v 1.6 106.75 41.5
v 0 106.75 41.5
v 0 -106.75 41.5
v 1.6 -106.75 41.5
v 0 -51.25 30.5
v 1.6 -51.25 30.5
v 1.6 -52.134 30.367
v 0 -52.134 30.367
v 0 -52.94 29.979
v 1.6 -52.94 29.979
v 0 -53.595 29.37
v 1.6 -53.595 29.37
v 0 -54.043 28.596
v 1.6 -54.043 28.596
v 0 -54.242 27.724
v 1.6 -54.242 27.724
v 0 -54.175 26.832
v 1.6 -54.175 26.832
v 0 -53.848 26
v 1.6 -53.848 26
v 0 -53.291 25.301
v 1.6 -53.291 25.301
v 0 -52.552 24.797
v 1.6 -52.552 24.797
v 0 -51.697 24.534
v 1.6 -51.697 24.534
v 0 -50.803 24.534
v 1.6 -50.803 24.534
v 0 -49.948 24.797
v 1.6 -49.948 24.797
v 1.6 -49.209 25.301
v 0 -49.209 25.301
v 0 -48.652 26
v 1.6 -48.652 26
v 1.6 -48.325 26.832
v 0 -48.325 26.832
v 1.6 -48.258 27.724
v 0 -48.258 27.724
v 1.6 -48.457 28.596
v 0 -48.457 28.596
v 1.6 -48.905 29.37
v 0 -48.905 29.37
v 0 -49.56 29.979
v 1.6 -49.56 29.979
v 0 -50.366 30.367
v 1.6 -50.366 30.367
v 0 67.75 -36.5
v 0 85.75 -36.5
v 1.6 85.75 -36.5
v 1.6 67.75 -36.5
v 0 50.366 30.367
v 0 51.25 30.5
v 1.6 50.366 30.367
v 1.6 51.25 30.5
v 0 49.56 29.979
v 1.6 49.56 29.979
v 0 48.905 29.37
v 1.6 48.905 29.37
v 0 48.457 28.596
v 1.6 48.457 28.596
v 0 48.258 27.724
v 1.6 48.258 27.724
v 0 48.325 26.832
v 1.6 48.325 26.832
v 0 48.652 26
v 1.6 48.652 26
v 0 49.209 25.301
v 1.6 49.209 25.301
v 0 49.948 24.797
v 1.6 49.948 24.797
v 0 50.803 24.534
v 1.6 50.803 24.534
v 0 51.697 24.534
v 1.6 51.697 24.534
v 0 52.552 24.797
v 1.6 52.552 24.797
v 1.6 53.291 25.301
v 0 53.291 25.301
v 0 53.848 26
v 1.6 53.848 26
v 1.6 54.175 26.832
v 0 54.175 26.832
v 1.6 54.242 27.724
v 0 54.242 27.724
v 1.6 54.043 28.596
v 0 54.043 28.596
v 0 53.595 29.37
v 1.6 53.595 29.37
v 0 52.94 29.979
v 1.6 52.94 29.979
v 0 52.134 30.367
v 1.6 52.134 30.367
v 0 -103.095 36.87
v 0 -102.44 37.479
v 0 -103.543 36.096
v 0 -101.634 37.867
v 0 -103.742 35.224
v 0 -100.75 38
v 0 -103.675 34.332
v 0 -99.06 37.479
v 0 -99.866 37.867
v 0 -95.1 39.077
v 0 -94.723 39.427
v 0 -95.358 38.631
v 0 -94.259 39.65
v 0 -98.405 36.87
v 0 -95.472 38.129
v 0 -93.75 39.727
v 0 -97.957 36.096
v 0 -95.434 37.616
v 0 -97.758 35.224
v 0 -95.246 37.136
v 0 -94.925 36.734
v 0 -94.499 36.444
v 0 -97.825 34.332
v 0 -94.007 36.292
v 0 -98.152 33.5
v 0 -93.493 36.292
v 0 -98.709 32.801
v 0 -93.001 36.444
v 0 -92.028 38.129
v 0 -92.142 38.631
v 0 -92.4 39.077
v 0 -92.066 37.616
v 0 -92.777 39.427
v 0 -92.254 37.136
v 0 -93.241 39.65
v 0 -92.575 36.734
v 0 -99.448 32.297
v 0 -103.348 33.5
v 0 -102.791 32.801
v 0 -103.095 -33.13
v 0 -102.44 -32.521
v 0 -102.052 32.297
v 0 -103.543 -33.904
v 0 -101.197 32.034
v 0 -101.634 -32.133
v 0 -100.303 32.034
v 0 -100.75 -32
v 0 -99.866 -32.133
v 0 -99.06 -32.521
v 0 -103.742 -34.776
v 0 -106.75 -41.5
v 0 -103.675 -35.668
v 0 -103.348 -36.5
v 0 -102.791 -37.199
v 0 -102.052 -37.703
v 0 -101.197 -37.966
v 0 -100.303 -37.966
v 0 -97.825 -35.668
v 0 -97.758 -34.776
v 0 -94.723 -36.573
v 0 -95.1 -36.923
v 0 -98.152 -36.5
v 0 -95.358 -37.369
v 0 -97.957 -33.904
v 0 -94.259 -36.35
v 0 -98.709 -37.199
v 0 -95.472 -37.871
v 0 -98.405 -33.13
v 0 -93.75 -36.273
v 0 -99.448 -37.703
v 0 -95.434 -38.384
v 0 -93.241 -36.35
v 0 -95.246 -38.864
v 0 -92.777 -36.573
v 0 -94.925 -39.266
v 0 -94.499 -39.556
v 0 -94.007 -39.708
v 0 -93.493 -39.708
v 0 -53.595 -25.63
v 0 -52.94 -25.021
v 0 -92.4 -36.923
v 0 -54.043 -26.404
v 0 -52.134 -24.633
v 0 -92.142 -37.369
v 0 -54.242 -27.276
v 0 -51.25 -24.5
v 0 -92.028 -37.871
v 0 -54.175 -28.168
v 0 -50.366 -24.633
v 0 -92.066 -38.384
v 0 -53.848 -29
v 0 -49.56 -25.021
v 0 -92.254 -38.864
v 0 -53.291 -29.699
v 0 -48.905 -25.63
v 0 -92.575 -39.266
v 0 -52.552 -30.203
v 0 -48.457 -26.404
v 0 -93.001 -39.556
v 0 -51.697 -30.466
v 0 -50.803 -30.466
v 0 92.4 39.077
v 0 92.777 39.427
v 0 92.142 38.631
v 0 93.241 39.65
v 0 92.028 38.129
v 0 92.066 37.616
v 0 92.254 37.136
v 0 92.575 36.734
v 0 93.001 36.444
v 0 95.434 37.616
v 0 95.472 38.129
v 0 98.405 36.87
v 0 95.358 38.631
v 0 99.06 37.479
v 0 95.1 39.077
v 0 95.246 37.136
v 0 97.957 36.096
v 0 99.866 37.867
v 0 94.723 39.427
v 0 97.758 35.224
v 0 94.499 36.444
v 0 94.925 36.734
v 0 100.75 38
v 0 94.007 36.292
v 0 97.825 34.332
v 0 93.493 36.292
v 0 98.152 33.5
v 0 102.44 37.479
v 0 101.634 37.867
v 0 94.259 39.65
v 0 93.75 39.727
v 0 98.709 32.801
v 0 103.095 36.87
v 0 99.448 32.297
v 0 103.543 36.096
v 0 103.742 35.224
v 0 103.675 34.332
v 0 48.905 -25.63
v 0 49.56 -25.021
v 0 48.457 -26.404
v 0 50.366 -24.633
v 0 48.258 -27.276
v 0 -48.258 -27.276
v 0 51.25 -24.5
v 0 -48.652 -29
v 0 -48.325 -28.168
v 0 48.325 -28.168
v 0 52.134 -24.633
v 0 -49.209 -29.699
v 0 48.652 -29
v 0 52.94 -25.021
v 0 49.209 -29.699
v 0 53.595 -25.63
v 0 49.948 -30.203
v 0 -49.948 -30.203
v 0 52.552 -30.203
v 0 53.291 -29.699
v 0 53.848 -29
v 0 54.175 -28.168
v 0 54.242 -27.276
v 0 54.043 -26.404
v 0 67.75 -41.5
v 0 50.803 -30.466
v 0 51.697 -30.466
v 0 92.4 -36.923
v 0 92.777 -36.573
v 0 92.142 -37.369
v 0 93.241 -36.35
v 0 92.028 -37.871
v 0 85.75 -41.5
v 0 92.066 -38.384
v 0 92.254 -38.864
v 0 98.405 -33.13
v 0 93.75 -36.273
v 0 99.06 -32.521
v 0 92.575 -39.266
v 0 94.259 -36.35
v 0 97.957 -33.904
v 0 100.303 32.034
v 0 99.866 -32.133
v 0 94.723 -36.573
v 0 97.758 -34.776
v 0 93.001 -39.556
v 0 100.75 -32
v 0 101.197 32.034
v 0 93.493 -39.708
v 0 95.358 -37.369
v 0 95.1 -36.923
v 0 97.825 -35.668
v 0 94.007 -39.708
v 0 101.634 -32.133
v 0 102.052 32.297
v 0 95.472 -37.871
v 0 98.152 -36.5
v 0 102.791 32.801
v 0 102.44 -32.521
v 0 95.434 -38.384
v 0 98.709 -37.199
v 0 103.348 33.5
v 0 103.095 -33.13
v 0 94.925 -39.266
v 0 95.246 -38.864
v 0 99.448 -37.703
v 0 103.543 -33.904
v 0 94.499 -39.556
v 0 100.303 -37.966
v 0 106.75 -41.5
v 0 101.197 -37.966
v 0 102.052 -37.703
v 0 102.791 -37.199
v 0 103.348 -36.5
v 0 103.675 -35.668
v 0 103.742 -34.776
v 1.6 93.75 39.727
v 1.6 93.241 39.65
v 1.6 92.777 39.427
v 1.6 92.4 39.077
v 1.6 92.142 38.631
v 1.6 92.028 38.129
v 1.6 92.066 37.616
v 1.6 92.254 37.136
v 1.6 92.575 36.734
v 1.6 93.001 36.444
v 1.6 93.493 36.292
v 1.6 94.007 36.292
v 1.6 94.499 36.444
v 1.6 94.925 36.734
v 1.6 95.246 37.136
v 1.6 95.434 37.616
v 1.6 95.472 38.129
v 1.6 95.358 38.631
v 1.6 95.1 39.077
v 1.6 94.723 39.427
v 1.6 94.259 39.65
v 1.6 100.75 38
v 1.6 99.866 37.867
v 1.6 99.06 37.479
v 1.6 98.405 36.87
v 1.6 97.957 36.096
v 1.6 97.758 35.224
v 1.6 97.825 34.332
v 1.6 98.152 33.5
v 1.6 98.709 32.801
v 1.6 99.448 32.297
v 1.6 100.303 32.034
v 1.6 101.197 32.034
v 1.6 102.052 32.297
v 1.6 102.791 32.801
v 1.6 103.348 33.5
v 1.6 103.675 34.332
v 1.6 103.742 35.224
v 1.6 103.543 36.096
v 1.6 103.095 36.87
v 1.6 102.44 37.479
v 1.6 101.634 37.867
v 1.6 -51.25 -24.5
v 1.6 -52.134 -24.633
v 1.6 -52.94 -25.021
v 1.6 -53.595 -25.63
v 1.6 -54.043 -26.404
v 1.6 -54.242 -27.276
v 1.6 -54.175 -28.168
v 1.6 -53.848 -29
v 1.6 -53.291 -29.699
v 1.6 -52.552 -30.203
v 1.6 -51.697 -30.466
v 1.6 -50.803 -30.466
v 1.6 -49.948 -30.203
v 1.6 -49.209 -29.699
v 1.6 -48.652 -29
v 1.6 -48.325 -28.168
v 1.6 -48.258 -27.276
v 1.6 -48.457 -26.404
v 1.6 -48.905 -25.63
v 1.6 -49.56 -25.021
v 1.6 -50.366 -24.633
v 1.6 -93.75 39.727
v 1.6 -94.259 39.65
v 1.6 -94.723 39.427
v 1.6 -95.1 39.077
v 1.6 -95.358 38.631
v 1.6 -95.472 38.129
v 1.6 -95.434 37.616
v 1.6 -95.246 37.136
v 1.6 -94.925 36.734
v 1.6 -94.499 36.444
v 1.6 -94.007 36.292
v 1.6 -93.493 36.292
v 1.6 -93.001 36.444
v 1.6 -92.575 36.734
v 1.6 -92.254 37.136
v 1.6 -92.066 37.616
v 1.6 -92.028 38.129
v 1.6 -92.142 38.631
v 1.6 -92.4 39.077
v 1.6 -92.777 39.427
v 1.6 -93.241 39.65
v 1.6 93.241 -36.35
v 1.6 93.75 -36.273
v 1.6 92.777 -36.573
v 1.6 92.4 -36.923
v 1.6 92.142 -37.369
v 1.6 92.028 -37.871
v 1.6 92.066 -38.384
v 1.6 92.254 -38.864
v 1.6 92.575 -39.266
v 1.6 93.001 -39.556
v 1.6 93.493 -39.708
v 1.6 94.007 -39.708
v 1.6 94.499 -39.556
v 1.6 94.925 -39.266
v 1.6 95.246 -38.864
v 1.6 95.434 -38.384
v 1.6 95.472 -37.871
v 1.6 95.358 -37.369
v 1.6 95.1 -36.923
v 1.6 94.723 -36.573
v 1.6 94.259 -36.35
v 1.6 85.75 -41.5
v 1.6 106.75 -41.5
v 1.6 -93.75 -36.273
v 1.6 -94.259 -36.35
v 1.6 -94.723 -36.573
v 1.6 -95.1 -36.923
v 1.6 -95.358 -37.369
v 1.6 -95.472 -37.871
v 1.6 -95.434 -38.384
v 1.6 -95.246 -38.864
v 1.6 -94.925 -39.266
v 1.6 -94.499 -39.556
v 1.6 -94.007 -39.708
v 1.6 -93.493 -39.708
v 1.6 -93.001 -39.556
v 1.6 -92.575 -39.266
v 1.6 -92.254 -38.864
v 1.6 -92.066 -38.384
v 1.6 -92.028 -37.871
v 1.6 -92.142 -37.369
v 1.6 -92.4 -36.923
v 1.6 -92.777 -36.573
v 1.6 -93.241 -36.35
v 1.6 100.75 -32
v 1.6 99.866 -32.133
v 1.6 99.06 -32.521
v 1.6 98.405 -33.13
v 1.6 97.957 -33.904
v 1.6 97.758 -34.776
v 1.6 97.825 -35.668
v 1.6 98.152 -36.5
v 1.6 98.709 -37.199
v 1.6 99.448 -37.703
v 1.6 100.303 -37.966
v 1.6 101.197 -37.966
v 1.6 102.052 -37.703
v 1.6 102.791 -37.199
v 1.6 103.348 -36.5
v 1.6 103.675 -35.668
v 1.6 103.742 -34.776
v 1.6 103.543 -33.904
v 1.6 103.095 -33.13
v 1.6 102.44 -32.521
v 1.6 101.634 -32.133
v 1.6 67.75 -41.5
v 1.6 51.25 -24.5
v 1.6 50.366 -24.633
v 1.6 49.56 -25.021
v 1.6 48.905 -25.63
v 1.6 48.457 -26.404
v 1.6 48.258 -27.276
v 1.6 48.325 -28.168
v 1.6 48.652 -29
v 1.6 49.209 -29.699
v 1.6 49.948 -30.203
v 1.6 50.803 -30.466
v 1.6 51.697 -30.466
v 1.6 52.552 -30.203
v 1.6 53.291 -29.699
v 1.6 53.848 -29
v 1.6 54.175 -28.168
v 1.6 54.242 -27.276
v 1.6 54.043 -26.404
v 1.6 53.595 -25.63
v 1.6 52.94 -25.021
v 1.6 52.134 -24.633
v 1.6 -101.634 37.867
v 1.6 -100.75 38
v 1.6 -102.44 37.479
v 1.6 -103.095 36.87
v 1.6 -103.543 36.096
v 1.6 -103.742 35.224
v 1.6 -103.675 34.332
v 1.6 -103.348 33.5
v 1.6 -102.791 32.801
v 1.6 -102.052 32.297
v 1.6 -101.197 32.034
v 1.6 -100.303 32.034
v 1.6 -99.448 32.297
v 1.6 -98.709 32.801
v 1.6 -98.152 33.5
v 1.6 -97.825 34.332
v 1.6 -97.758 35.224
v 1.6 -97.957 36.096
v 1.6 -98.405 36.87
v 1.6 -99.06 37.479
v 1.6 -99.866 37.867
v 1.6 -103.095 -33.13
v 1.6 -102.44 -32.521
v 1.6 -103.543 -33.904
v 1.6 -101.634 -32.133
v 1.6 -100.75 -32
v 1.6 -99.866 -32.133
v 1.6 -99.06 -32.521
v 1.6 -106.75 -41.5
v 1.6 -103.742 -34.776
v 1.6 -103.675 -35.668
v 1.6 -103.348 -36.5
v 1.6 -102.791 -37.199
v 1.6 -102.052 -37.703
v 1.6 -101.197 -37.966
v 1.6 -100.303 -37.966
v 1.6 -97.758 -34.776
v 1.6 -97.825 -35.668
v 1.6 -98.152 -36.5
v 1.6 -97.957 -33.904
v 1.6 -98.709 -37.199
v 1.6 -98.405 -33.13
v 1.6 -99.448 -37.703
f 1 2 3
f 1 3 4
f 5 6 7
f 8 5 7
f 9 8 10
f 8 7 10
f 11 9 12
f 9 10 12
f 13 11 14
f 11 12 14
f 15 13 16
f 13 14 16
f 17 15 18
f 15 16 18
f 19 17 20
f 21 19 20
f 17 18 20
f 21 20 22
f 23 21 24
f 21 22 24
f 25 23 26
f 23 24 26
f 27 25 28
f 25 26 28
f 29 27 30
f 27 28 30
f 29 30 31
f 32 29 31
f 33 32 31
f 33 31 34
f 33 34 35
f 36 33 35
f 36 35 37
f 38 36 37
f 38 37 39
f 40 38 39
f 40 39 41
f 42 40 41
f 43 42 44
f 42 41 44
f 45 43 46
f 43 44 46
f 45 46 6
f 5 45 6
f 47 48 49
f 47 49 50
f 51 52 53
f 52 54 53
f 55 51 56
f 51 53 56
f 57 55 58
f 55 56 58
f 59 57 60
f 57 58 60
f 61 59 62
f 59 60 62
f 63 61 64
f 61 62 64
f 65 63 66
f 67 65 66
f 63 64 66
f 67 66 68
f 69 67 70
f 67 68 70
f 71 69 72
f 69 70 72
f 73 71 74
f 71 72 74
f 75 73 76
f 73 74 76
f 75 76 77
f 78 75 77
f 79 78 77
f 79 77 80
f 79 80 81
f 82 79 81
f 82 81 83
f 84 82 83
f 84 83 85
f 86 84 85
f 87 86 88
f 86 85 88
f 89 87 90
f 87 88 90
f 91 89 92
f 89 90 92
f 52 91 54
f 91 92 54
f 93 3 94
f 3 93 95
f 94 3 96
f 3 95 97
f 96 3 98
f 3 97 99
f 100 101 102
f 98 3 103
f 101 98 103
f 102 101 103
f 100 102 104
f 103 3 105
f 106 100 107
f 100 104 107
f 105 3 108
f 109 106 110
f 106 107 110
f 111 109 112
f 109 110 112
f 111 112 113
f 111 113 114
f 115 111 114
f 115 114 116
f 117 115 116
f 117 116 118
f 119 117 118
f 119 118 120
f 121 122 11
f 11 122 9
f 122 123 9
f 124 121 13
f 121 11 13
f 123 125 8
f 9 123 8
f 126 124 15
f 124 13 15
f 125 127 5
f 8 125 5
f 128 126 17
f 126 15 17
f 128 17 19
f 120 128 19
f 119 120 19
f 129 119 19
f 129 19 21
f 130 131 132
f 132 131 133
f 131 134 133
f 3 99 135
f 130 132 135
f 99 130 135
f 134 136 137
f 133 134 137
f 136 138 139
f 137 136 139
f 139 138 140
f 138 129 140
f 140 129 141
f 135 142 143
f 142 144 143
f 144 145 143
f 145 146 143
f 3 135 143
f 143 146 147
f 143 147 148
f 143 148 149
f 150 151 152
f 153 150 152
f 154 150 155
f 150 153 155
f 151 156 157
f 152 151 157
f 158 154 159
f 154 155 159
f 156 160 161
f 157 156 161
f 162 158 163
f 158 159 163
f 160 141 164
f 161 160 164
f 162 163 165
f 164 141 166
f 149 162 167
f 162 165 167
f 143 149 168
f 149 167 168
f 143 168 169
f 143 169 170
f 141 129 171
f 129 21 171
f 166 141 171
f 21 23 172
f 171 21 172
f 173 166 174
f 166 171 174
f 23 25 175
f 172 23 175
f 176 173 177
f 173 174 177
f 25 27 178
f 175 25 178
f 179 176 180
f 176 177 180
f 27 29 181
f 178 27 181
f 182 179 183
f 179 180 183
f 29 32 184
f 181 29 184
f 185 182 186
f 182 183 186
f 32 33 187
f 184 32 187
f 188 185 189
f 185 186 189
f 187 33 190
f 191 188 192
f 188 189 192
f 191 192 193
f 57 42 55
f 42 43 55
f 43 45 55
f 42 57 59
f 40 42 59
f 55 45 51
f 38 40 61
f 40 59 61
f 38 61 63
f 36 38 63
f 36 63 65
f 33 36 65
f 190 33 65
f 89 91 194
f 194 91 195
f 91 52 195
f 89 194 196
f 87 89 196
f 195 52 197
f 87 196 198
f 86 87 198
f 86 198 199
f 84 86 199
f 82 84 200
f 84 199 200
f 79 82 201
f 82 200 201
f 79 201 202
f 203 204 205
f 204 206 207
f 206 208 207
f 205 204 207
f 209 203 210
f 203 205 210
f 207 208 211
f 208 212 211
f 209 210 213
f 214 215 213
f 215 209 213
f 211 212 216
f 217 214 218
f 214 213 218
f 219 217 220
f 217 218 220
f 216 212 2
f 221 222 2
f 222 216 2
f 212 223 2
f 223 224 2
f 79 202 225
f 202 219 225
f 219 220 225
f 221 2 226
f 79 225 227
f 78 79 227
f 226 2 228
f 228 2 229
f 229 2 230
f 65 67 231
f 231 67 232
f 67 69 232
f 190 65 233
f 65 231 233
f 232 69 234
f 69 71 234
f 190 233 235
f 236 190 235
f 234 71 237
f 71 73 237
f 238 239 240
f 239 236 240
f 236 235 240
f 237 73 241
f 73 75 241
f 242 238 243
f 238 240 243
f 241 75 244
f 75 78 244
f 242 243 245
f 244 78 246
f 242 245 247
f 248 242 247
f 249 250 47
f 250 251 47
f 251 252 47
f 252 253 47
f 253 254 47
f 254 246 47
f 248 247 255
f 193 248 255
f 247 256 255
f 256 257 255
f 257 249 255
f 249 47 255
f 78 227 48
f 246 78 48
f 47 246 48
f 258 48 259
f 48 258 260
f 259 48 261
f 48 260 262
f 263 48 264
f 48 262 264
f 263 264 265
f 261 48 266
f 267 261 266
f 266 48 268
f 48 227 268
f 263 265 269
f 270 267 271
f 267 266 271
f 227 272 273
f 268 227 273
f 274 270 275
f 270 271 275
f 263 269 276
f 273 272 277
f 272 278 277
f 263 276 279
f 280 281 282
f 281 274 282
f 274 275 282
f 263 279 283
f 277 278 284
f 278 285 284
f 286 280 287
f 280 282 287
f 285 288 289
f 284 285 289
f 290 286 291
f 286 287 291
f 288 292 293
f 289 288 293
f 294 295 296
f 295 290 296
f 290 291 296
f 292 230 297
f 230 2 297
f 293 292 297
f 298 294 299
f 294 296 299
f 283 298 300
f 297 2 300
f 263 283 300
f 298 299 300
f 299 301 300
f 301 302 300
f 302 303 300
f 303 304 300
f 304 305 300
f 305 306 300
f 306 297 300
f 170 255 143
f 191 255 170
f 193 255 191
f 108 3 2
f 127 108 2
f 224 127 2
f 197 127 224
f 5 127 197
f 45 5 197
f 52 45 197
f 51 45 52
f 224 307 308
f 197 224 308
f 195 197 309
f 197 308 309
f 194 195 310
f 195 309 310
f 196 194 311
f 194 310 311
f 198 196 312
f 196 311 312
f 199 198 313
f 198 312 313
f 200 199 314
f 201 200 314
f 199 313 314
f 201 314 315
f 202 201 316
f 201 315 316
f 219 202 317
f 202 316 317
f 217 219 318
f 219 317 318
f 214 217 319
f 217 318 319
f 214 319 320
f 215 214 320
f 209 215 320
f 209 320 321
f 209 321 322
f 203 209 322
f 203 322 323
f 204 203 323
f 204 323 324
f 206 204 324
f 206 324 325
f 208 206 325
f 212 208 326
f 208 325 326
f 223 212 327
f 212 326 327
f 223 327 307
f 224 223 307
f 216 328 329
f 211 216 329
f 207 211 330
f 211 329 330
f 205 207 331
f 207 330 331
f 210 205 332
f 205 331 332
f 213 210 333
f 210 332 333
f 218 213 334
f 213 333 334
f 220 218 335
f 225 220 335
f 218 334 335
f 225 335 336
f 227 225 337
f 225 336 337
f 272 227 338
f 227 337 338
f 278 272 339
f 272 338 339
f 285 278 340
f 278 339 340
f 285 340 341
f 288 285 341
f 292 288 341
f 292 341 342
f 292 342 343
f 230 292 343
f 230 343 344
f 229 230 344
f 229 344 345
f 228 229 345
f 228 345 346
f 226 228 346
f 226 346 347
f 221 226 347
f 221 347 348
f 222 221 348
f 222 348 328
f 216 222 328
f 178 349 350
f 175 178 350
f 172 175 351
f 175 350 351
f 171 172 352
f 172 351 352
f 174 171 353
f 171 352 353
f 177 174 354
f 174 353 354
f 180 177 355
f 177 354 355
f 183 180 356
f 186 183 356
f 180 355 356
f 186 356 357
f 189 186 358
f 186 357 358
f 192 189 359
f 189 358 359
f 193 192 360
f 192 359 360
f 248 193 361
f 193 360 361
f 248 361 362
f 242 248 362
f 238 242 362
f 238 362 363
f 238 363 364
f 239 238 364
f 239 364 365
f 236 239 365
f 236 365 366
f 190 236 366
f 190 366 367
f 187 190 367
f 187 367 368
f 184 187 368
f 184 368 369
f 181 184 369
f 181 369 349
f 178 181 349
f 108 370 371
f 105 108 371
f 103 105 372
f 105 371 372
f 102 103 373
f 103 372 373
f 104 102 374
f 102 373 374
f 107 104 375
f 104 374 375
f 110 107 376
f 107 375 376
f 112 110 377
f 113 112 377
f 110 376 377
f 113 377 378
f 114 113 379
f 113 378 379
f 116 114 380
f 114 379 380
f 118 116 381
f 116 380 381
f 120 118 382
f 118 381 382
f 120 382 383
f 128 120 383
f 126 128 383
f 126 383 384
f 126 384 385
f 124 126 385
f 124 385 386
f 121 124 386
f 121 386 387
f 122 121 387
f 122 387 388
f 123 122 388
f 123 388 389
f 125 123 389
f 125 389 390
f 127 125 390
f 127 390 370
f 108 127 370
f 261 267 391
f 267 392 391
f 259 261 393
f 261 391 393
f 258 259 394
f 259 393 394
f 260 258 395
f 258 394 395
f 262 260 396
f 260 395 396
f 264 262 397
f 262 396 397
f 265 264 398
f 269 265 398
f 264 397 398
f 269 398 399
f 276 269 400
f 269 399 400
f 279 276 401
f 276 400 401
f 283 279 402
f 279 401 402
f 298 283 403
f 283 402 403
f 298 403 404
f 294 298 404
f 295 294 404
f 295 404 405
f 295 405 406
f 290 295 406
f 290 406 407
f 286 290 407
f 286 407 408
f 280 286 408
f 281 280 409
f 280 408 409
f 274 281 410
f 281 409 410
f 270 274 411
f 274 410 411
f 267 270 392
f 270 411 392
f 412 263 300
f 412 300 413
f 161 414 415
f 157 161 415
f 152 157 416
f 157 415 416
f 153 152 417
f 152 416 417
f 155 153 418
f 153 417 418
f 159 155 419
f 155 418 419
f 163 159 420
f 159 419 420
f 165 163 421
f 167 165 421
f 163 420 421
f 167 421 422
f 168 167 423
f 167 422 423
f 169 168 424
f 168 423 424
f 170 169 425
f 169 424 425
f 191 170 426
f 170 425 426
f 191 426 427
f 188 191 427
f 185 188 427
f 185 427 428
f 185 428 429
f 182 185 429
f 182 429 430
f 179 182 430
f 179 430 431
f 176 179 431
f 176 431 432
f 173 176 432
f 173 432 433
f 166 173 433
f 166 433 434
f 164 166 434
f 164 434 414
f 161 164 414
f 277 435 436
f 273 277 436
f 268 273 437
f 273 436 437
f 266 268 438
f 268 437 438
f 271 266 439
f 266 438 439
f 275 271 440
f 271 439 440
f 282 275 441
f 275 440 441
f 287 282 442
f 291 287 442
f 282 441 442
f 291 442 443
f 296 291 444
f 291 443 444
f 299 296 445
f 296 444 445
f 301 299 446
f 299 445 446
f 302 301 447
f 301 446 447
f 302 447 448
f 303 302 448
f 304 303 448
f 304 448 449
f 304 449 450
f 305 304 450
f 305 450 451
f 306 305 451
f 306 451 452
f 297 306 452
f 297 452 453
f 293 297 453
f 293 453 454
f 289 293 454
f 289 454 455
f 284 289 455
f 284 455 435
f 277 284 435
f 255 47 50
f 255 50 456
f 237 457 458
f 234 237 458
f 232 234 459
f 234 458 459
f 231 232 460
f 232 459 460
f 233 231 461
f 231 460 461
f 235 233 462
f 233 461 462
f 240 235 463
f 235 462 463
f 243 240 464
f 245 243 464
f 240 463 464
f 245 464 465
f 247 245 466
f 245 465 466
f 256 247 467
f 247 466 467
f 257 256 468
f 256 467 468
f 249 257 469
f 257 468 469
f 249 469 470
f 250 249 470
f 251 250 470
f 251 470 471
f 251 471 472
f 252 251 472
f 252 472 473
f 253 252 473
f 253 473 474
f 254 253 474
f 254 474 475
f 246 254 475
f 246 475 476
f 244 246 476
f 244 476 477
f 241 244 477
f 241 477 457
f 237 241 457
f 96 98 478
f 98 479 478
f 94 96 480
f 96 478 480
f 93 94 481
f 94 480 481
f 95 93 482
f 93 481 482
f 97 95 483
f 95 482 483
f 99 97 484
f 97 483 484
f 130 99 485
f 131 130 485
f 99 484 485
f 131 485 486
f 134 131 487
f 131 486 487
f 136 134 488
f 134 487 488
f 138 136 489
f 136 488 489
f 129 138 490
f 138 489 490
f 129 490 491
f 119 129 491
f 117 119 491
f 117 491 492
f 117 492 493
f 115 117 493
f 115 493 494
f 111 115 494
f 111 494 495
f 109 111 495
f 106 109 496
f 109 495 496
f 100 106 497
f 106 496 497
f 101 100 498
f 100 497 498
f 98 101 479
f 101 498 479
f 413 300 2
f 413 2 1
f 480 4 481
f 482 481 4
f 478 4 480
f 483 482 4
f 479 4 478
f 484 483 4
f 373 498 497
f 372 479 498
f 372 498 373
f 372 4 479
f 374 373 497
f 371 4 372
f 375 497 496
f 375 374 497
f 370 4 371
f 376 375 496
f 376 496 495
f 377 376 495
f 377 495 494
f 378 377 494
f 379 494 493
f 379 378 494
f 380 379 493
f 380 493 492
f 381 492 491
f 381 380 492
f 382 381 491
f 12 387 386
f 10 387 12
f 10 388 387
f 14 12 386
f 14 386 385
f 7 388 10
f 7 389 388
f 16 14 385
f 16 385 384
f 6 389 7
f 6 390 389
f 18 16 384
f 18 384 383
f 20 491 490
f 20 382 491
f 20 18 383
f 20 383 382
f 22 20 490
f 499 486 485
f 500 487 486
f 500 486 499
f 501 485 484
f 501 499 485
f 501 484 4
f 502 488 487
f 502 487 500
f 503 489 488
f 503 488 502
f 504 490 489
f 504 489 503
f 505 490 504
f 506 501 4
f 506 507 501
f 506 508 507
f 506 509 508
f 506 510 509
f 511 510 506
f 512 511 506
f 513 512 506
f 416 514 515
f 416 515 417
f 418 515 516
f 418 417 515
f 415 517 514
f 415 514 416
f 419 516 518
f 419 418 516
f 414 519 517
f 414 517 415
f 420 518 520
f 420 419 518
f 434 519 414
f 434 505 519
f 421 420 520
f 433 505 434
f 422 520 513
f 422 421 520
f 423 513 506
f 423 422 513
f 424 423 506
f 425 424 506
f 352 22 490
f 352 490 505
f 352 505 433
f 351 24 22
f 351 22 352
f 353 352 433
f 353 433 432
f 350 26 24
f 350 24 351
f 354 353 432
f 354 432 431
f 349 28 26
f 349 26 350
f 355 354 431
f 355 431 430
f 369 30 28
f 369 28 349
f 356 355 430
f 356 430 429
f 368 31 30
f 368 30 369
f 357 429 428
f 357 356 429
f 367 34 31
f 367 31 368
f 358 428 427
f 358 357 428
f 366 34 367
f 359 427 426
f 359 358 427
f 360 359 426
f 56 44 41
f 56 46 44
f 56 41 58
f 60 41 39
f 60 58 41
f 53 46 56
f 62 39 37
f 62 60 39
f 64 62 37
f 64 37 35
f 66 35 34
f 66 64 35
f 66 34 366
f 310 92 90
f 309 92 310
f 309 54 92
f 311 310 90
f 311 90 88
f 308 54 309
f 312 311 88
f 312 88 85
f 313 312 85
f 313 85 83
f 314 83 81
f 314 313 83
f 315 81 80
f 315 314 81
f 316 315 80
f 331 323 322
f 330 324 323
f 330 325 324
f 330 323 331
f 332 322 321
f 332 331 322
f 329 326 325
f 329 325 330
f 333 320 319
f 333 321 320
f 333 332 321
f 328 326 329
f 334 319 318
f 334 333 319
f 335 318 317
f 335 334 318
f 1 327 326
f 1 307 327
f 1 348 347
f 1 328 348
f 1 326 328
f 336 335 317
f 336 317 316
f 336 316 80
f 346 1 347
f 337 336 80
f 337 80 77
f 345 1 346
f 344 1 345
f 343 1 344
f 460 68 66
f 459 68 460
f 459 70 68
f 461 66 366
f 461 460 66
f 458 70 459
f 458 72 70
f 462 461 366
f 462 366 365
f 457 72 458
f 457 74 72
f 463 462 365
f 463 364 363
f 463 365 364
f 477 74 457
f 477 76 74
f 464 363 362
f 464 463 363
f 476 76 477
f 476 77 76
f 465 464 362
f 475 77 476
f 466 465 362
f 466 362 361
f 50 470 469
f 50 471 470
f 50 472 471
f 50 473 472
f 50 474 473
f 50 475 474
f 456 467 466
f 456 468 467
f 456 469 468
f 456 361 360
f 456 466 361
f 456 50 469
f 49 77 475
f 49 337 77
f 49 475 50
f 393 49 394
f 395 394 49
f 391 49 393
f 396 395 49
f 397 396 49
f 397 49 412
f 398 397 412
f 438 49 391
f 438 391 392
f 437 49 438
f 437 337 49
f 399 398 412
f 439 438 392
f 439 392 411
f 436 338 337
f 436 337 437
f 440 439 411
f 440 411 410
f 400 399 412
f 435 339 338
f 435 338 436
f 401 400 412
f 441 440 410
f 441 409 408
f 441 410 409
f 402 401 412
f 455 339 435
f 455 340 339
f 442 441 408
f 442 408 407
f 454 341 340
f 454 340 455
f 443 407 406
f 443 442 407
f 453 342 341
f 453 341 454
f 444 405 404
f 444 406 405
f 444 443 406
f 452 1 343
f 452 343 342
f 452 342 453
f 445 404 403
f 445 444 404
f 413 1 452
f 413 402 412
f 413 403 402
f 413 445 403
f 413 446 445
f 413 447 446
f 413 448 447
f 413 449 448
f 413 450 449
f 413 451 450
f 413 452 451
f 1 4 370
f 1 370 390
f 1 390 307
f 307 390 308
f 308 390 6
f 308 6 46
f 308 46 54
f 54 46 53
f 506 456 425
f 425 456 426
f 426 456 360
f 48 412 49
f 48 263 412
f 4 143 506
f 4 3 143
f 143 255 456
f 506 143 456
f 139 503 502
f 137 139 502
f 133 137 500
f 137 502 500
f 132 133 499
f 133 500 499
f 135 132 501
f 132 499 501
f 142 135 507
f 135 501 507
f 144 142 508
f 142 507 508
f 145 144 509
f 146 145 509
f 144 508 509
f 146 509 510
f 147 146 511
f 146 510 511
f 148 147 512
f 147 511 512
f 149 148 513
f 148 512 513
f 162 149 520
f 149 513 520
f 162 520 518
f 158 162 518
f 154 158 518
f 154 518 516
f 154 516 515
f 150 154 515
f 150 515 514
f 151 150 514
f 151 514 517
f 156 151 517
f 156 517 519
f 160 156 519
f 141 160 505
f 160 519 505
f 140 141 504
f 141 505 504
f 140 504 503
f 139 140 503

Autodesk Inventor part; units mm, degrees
ref_plane "YZ Plane" through (0, 0, 0) normal (1, 0, 0) x (0, 1, 0)
ref_plane "XZ Plane" through (0, 0, 0) normal (0, 1, 0) x (-1, 0, 0)
ref_plane "XY Plane" through (0, 0, 0) normal (0, 0, 1) x (1, 0, 0)
sketch "Sketch1" plane through (0, 0, 0) normal (1, 0, 0) x (0, 1, 0)
  line L0 (50, 41.5) -> (-50, 41.5)
  line L1 (-50, 41.5) -> (-50, -41.5)
  line L2 (-50, -41.5) -> (50, -41.5)
  line L3 (50, -41.5) -> (50, 41.5)
  point P0 (0, 0)
  point P1 (50, 0)
  point P2 (0, -41.5)
  dimension "d0" = 100
  dimension "d1" = 83
extrude "Extrusion1" add sketch "Sketch1" along normal blind 1.6
sketch "Sketch12" plane through (0, 50, 41.5) normal (0, 1, 0) x (1, 0, 0)
  line L0 (0, 83) -> (0, 0) projected
  line L1 (0, 0) -> (1.6, 0) projected
  line L2 (1.6, 83) -> (1.6, 0) projected
  line L3 (0, 83) -> (1.6, 83) projected
  point P0 (0, 41.5)
extrude "Extrusion3" add sketch "Sketch12" along normal blind 56.75
sketch "Sketch13" plane through (0, -50, -41.5) normal (0, -1, 0) x (1, 0, 0)
  line L0 (0, 83) -> (0, 0) projected
  line L1 (0, 0) -> (1.6, 0) projected
  line L2 (1.6, 83) -> (1.6, 0) projected
  line L3 (0, 83) -> (1.6, 83) projected
  point P0 (0, 41.5)
extrude "Extrusion4" add sketch "Sketch13" along normal blind 56.75
sketch "Sketch14" plane through (0, 0, 0) normal (-1, 0, 0) x (0, 0, 1)
  point P0 (0, 0)
  point P1 (27.5, -51.25)
  point P2 (27.5, 51.25)
  point P3 (-27.5, -51.25)
  point P4 (-27.5, 51.25)
  dimension "d156" = 102.5
  dimension "d157" = 102.5
  dimension "d158" = 55
  dimension "d159" = 27.5
  dimension "d160" = 51.25
hole "Hole7" at (0, -51.25, 27.5) at (0, 51.25, 27.5) at (0, -51.25, -27.5) at (0, 51.25, -27.5) direction (1, 0, 0) diameter 6 end through all
sketch "Sketch16" plane through (0, 0, 0) normal (-1, 0, 0) x (0, 0, 1)
  circle A0 centre (-27.5, -51.25) radius 3 projected
  circle A1 centre (27.5, -51.25) radius 3 projected
  circle A2 centre (27.5, 51.25) radius 3 projected
  circle A3 centre (-27.5, 51.25) radius 3 projected
  line L0 (41.5, -106.75) -> (41.5, 106.75) projected
  line L1 (-41.5, 106.75) -> (41.5, 106.75) projected
  line L2 (-41.5, 106.75) -> (-41.5, -106.75) projected
  line L3 (41.5, -106.75) -> (-41.5, -106.75) projected
  line L4 (0, 0) -> (-25, 0) construction
  point P0 (35, -100.75)
  point P1 (-35, -100.75)
  point P2 (35, 100.75)
  point P3 (-35, 100.75)
  dimension "d168" = 70
  dimension "d169" = 6
  dimension "d170" = 35
hole "Hole8" at (0, -100.75, 35) at (0, -100.75, -35) at (0, 100.75, 35) at (0, 100.75, -35) direction (1, 0, 0) diameter 6 end through all
sketch "Sketch19" plane through (0, 0, 0) normal (-1, 0, 0) x (0, 0, 1)
  circle A0 centre (-27.5, 51.25) radius 3 construction
  line L0 (-39, 76.75) -> (-39, 72) construction
  line L1 (-39, 76.75) -> (-39, 81.5) construction
  line L2 (-41.5, 106.75) -> (-41.5, -106.75) construction
  line L3 (-41.5, 106.75) -> (41.5, 106.75) projected
  point P0 (0, 0)
  dimension "d194" = 4.75
  dimension "d195" = 4.75
  dimension "d203" = 25.25
  dimension "d204" = 2.5
hole "Hole9" at (0, 72, -39) at (0, 81.5, -39) direction (1, 0, 0) diameter 2.6 end through all clearance for "Flat Head Machine Screw" size "M2" standard "Ansi Metric M Profile"
sketch "Sketch21" plane through (0, 0, 0) normal (-1, 0, 0) x (0, 0, 1)
  line L0 (-41.5, 106.75) -> (-41.5, -106.75) projected
  line L1 (-41.5, 85.75) -> (-36.5, 85.75)
  line L2 (-36.5, 85.75) -> (-36.5, 67.75)
  line L3 (-36.5, 67.75) -> (-41.5, 67.75)
  line L4 (-41.5, 67.75) -> (-41.5, 85.75)
  line L5 (-41.5, 106.75) -> (41.5, 106.75) projected
  point P0 (0, 0)
  point P1 (-41.5, 67.75)
  dimension "d205" = 5
  dimension "d206" = 21
  dimension "d207" = 18
extrude "Extrusion5" cut sketch "Sketch21" against normal through all
sketch "Sketch23" plane through (0, 0, 0) normal (-1, 0, 0) x (0, 0, 1)
  circle A0 centre (-35, 100.75) radius 3 projected
  line L0 (0, 0) -> (-12.2775, 0) construction
  point P0 (38, 93.75)
  point P1 (-38, 93.75)
  point P2 (38, -93.75)
  point P3 (-38, -93.75)
  dimension "d220" = 76
  dimension "d221" = 38
  dimension "d229" = 7
hole "Hole11" at (0, 93.75, 38) at (0, 93.75, -38) at (0, -93.75, 38) at (0, -93.75, -38) direction (1, 0, 0) diameter 3.454 end through all clearance for "Flat Head Machine Screw (82)" size "#4" standard "Ansi Unified Screw Threads"
equation "\"d157\" = d156"
equation "\"d159\" = 0.5 * d158"
equation "\"d160\" = 0.5 * d157"
equation "\"d170\" = 0.5 * d168"
equation "\"d195\" = d194"
equation "\"d221\" = 0.5 * d220"
properties part number "SolarPCB_RBF_EGSE" material "Acetal Resin, Black"
